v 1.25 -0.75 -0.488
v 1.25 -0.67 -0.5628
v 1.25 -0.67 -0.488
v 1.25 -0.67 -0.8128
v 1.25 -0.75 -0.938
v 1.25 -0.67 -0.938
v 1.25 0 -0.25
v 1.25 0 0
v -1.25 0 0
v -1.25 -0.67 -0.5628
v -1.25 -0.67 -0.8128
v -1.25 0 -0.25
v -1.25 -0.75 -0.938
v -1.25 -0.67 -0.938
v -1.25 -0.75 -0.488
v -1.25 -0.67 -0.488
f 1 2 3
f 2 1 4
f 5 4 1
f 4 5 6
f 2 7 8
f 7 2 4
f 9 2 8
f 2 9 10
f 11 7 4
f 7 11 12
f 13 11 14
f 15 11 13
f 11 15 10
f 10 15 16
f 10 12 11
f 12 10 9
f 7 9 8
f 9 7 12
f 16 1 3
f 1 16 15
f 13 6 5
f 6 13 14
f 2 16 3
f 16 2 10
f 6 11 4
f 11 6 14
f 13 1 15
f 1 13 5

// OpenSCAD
// file: lib/lodge_kit.scad
// Lodge shell tile kit — shared dimensions and modules.
//
// The game paints a lodge footprint in 5 m cells and resolves the
// exterior from these tiles at half-cell (2.5 m) resolution; see
// internal/world/lodge_shell.go. Every tile is authored in the same
// canonical frame:
//
//   * origin on the lodge floor plane (Z = 0);
//   * wall-type tiles sit on a footprint edge, centred on it, with the
//     OUTSIDE toward SCAD −Y (game +Z) and the wall thickness toward +Y;
//   * roof tiles are centred on a half-cell, with Z = 0 at the tile's
//     lowest corner; slopes fall toward −Y (game +Z);
//   * corner tiles sit on a grid vertex; an outer corner's building is
//     in the SCAD (−X, +Y) quadrant, an inner corner's notch in (+X, −Y).
//
// Colours are near-neutral: the renderer tints walls and roofs per lodge
// from a seeded palette (world.ShellPalette).
//
// Keep these in sync with the constants in lodge_shell.go.

tile   = 2.5;   // ShellTileSize
wall_h = 5.0;   // ShellWallHeight
rise   = 2.1;   // ShellRoofRise, per tile of run
pitch  = rise / tile;

wall_t   = 0.35;  // wall thickness
sink     = 1.5;   // walls run this far below the floor to hide pad grading
roof_t   = 0.25;  // roof slab thickness
overhang = 0.7;   // eaves overhang past the wall plane

c_wall   = [0.92, 0.90, 0.86];
c_stone  = [0.62, 0.61, 0.60];
c_trim   = [0.97, 0.97, 0.95];
c_glass  = [0.30, 0.42, 0.52];
c_door   = [0.36, 0.25, 0.18];
c_roof   = [0.97, 0.97, 0.97];
c_fascia = [0.55, 0.52, 0.50];

// Plain wall panel: timber above a stone plinth, a trim band under the
// eaves.
module wall_panel() {
    color(c_wall)
        translate([-tile/2, 0, -sink]) cube([tile, wall_t, wall_h + sink]);
    color(c_stone)
        translate([-tile/2, -0.06, -sink]) cube([tile, wall_t, sink + 0.7]);
    color(c_trim)
        translate([-tile/2, -0.04, wall_h - 0.3]) cube([tile, 0.1, 0.3]);
    battens();
}

// Horizontal board lines above the plinth.
module battens() {
    color(c_wall * 0.8)
        for (z = [1.3 : 0.6 : wall_h - 0.6])
            translate([-tile/2, -0.03, z]) cube([tile, 0.04, 0.06]);
}

// A framed pane on the outer face. x0/w along the wall, z0/h up it.
module pane(x0, w, z0, h) {
    color(c_trim)
        translate([x0 - 0.1, -0.05, z0 - 0.1]) cube([w + 0.2, 0.06, h + 0.2]);
    color(c_glass)
        translate([x0, -0.08, z0]) cube([w, 0.06, h]);
}

module wall_window() {
    wall_panel();
    pane(-0.7, 1.4, 1.4, 2.2);
    color(c_trim) translate([-0.02, -0.1, 1.4]) cube([0.04, 0.04, 2.2]); // mullion
}

// Tall window flanked by shutters.
module wall_window_alt() {
    wall_panel();
    pane(-0.5, 1.0, 1.2, 2.8);
    color(c_door) {
        translate([-1.0, -0.1, 1.2]) cube([0.4, 0.05, 2.8]);
        translate([ 0.6, -0.1, 1.2]) cube([0.4, 0.05, 2.8]);
    }
}

// Floor-to-eave glazing for food courts: a low stone sill, then glass in
// three lights.
module wall_glazed() {
    color(c_wall)
        translate([-tile/2, 0, -sink]) cube([tile, wall_t, wall_h + sink]);
    color(c_stone)
        translate([-tile/2, -0.06, -sink]) cube([tile, wall_t, sink + 0.35]);
    color(c_glass)
        translate([-tile/2, -0.09, 0.35]) cube([tile, 0.06, wall_h - 0.75]);
    color(c_trim) {
        for (x = [-tile/2, -tile/6, tile/6, tile/2 - 0.08])
            translate([x, -0.12, 0.35]) cube([0.08, 0.06, wall_h - 0.75]);
        translate([-tile/2, -0.12, wall_h - 0.45]) cube([tile, 0.07, 0.1]);
    }
}

// Glazed entry door under a small canopy, with a step.
module door() {
    color(c_wall)
        translate([-tile/2, 0, -sink]) cube([tile, wall_t, wall_h + sink]);
    color(c_stone)
        translate([-tile/2, -0.06, -sink]) cube([tile, wall_t, sink + 0.15]);
    battens();
    color(c_door)
        translate([-0.9, -0.1, 0]) cube([1.8, 0.1, 2.7]);
    color(c_glass) {
        translate([-0.75, -0.13, 0.9]) cube([0.65, 0.05, 1.6]);
        translate([ 0.10, -0.13, 0.9]) cube([0.65, 0.05, 1.6]);
    }
    color(c_trim)
        translate([-tile/2, -0.04, wall_h - 0.3]) cube([tile, 0.1, 0.3]);
    color(c_roof)   // canopy
        translate([-1.2, -1.3, 3.0])
            rotate([-12, 0, 0]) cube([2.4, 1.3, 0.12]);
    color(c_stone)  // step
        translate([-1.1, -0.9, -0.3]) cube([2.2, 0.9, 0.42]);
}

module corner_outer() {
    color(c_stone)
        translate([-0.3, -0.05, -sink]) cube([0.35, 0.35, wall_h + sink - 0.3]);
}

module corner_inner() {
    color(c_trim)
        translate([0, -0.12, 0]) cube([0.12, 0.12, wall_h - 0.3]);
}

// Roof slab over one half-cell. h lists corner heights (in rise units)
// in SCAD order (−X,+Y), (+X,+Y), (+X,−Y), (−X,−Y); split names which
// diagonal the top surface folds along: 0 through corners 0–2, 1
// through corners 1–3.
module roof_tile(h, split) {
    p = [[-tile/2, tile/2], [tile/2, tile/2], [tile/2, -tile/2], [-tile/2, -tile/2]];
    top = [for (i = [0:3]) [p[i][0], p[i][1], h[i] * rise]];
    bot = [for (i = [0:3]) [p[i][0], p[i][1], h[i] * rise - roof_t]];
    tris = split == 0 ? [[0, 1, 2], [0, 2, 3]] : [[0, 1, 3], [1, 2, 3]];
    color(c_roof)
        polyhedron(
            points = concat(top, bot),
            faces = concat(
                // top (clockwise seen from above = outward in OpenSCAD)
                [for (t = tris) [t[0], t[1], t[2]]],
                [for (t = tris) [t[2] + 4, t[1] + 4, t[0] + 4]],
                [for (i = [0:3]) [i, i + 4, (i + 1) % 4 + 4, (i + 1) % 4]]
            ));
}

// Eaves strip past a wall edge: continues the roof plane outward and
// down, finished with a fascia board.
module eave() {
    drop = overhang * pitch;
    color(c_roof)
        polyhedron(
            points = [
                [-tile/2, 0, 0], [tile/2, 0, 0], [tile/2, -overhang, -drop], [-tile/2, -overhang, -drop],
                [-tile/2, 0, -roof_t], [tile/2, 0, -roof_t], [tile/2, -overhang, -drop - roof_t], [-tile/2, -overhang, -drop - roof_t],
            ],
            faces = [[0, 1, 2, 3], [7, 6, 5, 4], [0, 4, 5, 1], [1, 5, 6, 2], [2, 6, 7, 3], [3, 7, 4, 0]]);
    color(c_fascia)
        translate([-tile/2, -overhang - 0.05, -drop - roof_t - 0.1]) cube([tile, 0.08, roof_t + 0.2]);
}

// Eaves in the square past an outer corner: a hip folding along the
// diagonal away from the building.
module eave_corner() {
    o = overhang;
    d = o * pitch;
    color(c_roof)
        polyhedron(
            points = [
                [0, 0, 0], [o, 0, -d], [o, -o, -d], [0, -o, -d],
                [0, 0, -roof_t], [o, 0, -d - roof_t], [o, -o, -d - roof_t], [0, -o, -d - roof_t],
            ],
            faces = [[0, 1, 2], [0, 2, 3], [6, 5, 4], [7, 6, 4], [0, 4, 5, 1], [1, 5, 6, 2], [2, 6, 7, 3], [3, 7, 4, 0]]);
    color(c_fascia) {
        translate([0, -o - 0.05, -d - roof_t - 0.1]) cube([o + 0.05, 0.08, roof_t + 0.2]);
        translate([o - 0.03, -o - 0.05, -d - roof_t - 0.1]) cube([0.08, o + 0.05, roof_t + 0.2]);
    }
}

module chimney() {
    color(c_stone)
        translate([-0.55, -0.55, -1.0]) cube([1.1, 1.1, rise + 3.0]);
    color(c_fascia)
        translate([-0.65, -0.65, rise + 1.8]) cube([1.3, 1.3, 0.2]);
}
// main file
// Lodge shell kit: eaves strip. See lib/lodge_kit.scad.
include <lib/lodge_kit.scad>
eave();
